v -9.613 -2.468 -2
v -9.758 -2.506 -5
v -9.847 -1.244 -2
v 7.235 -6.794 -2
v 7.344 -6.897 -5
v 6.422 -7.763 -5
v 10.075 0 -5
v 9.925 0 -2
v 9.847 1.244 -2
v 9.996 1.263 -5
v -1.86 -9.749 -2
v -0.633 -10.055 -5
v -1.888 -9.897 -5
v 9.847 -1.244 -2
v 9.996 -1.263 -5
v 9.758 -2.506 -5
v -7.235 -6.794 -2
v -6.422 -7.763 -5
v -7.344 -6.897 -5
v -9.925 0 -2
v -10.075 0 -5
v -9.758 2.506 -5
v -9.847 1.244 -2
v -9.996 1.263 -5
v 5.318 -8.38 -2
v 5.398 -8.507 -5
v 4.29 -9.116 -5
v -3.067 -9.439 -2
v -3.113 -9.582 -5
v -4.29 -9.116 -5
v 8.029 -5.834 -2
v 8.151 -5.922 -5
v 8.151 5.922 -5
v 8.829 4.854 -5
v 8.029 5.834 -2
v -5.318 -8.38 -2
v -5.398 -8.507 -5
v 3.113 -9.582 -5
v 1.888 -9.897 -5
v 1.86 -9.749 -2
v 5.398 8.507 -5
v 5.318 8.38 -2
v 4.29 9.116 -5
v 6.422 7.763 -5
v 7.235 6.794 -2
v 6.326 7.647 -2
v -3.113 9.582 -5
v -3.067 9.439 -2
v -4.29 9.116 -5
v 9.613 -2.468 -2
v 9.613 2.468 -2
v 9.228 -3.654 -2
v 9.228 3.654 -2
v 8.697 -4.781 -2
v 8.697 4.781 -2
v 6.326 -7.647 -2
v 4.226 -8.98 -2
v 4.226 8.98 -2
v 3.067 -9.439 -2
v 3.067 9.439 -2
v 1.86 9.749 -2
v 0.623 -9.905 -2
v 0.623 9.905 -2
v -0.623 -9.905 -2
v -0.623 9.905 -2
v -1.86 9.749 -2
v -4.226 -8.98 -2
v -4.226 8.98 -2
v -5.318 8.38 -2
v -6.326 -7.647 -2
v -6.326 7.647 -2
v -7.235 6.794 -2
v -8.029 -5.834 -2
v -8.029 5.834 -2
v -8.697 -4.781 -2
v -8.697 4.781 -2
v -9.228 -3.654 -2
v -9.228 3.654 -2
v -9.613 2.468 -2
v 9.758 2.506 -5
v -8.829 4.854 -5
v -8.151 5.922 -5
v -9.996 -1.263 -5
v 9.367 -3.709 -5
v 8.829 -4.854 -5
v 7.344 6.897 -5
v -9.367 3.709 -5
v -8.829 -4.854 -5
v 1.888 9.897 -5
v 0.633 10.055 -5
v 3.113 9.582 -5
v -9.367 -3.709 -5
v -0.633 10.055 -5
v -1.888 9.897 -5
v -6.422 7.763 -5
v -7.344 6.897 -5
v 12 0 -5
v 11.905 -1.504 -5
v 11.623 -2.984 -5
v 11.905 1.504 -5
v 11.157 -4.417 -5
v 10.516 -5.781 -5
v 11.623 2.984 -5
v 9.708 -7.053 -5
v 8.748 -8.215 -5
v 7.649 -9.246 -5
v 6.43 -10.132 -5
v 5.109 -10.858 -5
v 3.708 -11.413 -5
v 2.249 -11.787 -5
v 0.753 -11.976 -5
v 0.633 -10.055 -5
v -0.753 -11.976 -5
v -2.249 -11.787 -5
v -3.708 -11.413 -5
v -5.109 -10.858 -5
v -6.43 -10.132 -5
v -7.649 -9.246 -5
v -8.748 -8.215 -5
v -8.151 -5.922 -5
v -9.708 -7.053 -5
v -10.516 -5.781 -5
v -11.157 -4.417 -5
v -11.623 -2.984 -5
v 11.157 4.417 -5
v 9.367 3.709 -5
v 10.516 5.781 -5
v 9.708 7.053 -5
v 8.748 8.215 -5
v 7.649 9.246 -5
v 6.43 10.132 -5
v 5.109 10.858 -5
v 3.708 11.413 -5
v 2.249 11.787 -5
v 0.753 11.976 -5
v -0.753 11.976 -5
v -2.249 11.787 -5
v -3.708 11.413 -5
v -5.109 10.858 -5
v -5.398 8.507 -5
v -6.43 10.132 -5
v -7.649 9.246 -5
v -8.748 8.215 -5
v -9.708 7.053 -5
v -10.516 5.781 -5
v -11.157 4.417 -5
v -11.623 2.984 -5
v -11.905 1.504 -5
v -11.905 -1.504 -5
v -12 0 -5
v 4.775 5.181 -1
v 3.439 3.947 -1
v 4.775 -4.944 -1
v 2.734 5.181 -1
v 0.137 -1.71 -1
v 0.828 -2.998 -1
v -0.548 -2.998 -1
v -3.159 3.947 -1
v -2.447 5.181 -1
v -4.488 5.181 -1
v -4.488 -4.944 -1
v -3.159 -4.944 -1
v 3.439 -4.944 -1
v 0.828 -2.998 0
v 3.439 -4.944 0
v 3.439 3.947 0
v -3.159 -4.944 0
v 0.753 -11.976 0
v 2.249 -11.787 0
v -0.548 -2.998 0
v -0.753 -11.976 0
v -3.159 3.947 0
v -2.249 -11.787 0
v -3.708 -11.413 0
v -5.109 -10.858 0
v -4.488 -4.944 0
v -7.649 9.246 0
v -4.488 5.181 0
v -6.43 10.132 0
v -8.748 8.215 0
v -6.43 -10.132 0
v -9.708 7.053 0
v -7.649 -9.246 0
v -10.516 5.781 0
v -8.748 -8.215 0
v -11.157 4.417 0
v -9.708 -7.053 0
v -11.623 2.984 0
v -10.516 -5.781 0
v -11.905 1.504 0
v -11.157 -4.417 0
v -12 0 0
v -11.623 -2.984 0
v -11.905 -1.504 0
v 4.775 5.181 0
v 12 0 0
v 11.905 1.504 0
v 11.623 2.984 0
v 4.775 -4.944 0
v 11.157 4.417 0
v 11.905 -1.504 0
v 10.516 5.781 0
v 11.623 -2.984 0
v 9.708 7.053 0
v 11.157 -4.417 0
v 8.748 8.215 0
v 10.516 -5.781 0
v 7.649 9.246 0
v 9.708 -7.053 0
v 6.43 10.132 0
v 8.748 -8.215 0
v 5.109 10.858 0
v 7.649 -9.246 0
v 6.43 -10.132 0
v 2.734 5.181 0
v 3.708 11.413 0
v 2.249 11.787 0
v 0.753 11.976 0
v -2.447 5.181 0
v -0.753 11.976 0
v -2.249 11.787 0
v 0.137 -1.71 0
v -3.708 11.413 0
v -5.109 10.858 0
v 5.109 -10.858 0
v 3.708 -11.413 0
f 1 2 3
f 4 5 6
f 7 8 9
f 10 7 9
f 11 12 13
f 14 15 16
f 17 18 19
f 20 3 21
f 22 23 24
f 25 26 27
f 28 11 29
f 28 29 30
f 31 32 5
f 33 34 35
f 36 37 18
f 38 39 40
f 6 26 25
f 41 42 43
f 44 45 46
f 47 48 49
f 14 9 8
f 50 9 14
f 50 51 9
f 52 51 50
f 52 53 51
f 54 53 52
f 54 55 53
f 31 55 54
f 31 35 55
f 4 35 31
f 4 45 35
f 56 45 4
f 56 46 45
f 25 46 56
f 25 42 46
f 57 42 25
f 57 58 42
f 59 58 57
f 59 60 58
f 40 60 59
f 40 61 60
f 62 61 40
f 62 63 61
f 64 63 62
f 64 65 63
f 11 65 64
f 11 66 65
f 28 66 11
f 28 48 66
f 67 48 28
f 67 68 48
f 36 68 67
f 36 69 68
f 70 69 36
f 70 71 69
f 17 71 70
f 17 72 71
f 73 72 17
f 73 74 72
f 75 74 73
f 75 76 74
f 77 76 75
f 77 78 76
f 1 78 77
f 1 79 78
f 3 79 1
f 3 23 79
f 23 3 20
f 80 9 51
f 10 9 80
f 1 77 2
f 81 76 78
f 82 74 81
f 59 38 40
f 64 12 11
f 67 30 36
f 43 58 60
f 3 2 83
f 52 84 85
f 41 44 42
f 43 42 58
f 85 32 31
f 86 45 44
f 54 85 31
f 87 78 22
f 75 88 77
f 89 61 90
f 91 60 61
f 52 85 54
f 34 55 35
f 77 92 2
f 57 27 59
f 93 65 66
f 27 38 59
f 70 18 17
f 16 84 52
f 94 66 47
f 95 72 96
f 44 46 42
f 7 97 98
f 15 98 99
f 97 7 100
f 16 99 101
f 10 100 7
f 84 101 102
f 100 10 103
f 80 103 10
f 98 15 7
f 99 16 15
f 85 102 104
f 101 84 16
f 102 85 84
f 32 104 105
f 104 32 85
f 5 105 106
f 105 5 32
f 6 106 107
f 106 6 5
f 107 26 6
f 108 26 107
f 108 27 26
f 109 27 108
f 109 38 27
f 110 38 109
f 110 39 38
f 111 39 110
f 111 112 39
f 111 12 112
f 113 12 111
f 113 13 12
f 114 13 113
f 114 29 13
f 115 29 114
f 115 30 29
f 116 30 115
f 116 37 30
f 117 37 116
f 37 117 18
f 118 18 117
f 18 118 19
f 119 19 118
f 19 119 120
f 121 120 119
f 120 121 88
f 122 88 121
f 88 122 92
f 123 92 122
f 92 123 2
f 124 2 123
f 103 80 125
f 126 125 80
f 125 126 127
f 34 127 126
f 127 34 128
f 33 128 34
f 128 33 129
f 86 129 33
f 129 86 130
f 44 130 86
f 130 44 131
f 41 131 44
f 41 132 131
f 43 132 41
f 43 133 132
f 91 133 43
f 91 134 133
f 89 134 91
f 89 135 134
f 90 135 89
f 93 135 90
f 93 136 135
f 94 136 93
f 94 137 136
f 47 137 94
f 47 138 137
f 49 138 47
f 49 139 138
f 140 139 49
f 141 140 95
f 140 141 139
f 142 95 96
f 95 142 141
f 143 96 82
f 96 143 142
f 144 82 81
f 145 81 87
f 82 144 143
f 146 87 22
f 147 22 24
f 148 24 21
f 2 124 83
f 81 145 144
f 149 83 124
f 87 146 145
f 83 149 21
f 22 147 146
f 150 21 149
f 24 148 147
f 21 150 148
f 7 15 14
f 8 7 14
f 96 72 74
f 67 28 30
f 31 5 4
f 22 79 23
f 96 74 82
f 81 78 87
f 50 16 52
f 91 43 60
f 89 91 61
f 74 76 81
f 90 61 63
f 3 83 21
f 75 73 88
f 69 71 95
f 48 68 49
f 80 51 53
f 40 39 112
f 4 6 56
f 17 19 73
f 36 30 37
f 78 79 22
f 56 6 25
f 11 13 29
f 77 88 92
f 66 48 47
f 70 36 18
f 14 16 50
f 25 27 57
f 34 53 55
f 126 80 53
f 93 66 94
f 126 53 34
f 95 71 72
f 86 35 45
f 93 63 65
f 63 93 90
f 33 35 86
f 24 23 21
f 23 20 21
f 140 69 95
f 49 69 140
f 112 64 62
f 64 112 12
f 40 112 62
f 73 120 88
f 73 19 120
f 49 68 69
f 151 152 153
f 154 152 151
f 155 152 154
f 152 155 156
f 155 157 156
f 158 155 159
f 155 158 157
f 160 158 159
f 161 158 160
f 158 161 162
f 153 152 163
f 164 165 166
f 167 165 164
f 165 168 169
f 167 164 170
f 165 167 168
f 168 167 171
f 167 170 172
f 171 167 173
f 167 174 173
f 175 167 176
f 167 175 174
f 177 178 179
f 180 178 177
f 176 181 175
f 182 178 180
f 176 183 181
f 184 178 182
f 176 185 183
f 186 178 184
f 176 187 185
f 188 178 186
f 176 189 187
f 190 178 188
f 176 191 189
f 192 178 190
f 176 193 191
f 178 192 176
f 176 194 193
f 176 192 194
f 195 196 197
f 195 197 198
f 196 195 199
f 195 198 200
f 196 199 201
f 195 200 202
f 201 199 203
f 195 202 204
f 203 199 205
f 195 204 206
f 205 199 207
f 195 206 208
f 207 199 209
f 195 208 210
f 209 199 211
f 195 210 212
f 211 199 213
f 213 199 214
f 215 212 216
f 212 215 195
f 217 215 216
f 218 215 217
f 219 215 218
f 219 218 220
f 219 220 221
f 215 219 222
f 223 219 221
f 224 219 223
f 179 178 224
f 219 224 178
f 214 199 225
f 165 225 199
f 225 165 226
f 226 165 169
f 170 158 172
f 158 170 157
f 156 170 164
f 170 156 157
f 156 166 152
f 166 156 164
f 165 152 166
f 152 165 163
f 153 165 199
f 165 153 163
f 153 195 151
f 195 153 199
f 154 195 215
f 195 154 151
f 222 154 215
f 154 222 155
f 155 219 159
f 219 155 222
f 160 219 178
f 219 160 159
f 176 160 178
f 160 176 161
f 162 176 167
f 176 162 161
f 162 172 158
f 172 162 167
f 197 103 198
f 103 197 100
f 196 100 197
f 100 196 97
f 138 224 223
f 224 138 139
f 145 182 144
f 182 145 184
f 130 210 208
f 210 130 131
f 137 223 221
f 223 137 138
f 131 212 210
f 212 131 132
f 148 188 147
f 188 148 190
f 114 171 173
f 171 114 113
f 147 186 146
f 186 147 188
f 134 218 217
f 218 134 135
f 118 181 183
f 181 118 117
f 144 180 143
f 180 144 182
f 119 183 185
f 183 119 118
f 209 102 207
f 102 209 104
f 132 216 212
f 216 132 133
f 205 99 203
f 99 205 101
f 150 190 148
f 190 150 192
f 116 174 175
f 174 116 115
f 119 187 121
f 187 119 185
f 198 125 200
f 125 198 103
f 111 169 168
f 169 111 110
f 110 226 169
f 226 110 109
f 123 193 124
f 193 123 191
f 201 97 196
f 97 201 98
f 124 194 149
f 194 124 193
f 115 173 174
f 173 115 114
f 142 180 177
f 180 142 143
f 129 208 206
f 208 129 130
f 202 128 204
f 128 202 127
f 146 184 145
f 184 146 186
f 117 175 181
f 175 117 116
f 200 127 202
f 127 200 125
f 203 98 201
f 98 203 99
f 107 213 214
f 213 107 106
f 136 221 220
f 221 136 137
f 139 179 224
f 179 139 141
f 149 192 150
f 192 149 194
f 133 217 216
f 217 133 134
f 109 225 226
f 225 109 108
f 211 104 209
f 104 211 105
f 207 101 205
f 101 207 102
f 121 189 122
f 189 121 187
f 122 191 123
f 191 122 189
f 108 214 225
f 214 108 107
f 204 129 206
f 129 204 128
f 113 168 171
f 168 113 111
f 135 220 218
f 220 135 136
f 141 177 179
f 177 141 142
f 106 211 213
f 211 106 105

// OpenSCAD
$fn = 50;

difference() {
	union() {
		translate(v = [0, 0, -5.0]) {
			cylinder(h = 5, r = 12.0);
		}
	}
	union() {
		#translate(v = [0, 0, -5.0]) {
			cylinder(h = 3, r1 = 10.075, r2 = 9.925);
		}
		translate(v = [0, 0, -1]) {
			linear_extrude(height = 1) {
				text(font = "Impact", halign = "center", size = 10, text = "M", valign = "center");
			}
		}
	}
}
